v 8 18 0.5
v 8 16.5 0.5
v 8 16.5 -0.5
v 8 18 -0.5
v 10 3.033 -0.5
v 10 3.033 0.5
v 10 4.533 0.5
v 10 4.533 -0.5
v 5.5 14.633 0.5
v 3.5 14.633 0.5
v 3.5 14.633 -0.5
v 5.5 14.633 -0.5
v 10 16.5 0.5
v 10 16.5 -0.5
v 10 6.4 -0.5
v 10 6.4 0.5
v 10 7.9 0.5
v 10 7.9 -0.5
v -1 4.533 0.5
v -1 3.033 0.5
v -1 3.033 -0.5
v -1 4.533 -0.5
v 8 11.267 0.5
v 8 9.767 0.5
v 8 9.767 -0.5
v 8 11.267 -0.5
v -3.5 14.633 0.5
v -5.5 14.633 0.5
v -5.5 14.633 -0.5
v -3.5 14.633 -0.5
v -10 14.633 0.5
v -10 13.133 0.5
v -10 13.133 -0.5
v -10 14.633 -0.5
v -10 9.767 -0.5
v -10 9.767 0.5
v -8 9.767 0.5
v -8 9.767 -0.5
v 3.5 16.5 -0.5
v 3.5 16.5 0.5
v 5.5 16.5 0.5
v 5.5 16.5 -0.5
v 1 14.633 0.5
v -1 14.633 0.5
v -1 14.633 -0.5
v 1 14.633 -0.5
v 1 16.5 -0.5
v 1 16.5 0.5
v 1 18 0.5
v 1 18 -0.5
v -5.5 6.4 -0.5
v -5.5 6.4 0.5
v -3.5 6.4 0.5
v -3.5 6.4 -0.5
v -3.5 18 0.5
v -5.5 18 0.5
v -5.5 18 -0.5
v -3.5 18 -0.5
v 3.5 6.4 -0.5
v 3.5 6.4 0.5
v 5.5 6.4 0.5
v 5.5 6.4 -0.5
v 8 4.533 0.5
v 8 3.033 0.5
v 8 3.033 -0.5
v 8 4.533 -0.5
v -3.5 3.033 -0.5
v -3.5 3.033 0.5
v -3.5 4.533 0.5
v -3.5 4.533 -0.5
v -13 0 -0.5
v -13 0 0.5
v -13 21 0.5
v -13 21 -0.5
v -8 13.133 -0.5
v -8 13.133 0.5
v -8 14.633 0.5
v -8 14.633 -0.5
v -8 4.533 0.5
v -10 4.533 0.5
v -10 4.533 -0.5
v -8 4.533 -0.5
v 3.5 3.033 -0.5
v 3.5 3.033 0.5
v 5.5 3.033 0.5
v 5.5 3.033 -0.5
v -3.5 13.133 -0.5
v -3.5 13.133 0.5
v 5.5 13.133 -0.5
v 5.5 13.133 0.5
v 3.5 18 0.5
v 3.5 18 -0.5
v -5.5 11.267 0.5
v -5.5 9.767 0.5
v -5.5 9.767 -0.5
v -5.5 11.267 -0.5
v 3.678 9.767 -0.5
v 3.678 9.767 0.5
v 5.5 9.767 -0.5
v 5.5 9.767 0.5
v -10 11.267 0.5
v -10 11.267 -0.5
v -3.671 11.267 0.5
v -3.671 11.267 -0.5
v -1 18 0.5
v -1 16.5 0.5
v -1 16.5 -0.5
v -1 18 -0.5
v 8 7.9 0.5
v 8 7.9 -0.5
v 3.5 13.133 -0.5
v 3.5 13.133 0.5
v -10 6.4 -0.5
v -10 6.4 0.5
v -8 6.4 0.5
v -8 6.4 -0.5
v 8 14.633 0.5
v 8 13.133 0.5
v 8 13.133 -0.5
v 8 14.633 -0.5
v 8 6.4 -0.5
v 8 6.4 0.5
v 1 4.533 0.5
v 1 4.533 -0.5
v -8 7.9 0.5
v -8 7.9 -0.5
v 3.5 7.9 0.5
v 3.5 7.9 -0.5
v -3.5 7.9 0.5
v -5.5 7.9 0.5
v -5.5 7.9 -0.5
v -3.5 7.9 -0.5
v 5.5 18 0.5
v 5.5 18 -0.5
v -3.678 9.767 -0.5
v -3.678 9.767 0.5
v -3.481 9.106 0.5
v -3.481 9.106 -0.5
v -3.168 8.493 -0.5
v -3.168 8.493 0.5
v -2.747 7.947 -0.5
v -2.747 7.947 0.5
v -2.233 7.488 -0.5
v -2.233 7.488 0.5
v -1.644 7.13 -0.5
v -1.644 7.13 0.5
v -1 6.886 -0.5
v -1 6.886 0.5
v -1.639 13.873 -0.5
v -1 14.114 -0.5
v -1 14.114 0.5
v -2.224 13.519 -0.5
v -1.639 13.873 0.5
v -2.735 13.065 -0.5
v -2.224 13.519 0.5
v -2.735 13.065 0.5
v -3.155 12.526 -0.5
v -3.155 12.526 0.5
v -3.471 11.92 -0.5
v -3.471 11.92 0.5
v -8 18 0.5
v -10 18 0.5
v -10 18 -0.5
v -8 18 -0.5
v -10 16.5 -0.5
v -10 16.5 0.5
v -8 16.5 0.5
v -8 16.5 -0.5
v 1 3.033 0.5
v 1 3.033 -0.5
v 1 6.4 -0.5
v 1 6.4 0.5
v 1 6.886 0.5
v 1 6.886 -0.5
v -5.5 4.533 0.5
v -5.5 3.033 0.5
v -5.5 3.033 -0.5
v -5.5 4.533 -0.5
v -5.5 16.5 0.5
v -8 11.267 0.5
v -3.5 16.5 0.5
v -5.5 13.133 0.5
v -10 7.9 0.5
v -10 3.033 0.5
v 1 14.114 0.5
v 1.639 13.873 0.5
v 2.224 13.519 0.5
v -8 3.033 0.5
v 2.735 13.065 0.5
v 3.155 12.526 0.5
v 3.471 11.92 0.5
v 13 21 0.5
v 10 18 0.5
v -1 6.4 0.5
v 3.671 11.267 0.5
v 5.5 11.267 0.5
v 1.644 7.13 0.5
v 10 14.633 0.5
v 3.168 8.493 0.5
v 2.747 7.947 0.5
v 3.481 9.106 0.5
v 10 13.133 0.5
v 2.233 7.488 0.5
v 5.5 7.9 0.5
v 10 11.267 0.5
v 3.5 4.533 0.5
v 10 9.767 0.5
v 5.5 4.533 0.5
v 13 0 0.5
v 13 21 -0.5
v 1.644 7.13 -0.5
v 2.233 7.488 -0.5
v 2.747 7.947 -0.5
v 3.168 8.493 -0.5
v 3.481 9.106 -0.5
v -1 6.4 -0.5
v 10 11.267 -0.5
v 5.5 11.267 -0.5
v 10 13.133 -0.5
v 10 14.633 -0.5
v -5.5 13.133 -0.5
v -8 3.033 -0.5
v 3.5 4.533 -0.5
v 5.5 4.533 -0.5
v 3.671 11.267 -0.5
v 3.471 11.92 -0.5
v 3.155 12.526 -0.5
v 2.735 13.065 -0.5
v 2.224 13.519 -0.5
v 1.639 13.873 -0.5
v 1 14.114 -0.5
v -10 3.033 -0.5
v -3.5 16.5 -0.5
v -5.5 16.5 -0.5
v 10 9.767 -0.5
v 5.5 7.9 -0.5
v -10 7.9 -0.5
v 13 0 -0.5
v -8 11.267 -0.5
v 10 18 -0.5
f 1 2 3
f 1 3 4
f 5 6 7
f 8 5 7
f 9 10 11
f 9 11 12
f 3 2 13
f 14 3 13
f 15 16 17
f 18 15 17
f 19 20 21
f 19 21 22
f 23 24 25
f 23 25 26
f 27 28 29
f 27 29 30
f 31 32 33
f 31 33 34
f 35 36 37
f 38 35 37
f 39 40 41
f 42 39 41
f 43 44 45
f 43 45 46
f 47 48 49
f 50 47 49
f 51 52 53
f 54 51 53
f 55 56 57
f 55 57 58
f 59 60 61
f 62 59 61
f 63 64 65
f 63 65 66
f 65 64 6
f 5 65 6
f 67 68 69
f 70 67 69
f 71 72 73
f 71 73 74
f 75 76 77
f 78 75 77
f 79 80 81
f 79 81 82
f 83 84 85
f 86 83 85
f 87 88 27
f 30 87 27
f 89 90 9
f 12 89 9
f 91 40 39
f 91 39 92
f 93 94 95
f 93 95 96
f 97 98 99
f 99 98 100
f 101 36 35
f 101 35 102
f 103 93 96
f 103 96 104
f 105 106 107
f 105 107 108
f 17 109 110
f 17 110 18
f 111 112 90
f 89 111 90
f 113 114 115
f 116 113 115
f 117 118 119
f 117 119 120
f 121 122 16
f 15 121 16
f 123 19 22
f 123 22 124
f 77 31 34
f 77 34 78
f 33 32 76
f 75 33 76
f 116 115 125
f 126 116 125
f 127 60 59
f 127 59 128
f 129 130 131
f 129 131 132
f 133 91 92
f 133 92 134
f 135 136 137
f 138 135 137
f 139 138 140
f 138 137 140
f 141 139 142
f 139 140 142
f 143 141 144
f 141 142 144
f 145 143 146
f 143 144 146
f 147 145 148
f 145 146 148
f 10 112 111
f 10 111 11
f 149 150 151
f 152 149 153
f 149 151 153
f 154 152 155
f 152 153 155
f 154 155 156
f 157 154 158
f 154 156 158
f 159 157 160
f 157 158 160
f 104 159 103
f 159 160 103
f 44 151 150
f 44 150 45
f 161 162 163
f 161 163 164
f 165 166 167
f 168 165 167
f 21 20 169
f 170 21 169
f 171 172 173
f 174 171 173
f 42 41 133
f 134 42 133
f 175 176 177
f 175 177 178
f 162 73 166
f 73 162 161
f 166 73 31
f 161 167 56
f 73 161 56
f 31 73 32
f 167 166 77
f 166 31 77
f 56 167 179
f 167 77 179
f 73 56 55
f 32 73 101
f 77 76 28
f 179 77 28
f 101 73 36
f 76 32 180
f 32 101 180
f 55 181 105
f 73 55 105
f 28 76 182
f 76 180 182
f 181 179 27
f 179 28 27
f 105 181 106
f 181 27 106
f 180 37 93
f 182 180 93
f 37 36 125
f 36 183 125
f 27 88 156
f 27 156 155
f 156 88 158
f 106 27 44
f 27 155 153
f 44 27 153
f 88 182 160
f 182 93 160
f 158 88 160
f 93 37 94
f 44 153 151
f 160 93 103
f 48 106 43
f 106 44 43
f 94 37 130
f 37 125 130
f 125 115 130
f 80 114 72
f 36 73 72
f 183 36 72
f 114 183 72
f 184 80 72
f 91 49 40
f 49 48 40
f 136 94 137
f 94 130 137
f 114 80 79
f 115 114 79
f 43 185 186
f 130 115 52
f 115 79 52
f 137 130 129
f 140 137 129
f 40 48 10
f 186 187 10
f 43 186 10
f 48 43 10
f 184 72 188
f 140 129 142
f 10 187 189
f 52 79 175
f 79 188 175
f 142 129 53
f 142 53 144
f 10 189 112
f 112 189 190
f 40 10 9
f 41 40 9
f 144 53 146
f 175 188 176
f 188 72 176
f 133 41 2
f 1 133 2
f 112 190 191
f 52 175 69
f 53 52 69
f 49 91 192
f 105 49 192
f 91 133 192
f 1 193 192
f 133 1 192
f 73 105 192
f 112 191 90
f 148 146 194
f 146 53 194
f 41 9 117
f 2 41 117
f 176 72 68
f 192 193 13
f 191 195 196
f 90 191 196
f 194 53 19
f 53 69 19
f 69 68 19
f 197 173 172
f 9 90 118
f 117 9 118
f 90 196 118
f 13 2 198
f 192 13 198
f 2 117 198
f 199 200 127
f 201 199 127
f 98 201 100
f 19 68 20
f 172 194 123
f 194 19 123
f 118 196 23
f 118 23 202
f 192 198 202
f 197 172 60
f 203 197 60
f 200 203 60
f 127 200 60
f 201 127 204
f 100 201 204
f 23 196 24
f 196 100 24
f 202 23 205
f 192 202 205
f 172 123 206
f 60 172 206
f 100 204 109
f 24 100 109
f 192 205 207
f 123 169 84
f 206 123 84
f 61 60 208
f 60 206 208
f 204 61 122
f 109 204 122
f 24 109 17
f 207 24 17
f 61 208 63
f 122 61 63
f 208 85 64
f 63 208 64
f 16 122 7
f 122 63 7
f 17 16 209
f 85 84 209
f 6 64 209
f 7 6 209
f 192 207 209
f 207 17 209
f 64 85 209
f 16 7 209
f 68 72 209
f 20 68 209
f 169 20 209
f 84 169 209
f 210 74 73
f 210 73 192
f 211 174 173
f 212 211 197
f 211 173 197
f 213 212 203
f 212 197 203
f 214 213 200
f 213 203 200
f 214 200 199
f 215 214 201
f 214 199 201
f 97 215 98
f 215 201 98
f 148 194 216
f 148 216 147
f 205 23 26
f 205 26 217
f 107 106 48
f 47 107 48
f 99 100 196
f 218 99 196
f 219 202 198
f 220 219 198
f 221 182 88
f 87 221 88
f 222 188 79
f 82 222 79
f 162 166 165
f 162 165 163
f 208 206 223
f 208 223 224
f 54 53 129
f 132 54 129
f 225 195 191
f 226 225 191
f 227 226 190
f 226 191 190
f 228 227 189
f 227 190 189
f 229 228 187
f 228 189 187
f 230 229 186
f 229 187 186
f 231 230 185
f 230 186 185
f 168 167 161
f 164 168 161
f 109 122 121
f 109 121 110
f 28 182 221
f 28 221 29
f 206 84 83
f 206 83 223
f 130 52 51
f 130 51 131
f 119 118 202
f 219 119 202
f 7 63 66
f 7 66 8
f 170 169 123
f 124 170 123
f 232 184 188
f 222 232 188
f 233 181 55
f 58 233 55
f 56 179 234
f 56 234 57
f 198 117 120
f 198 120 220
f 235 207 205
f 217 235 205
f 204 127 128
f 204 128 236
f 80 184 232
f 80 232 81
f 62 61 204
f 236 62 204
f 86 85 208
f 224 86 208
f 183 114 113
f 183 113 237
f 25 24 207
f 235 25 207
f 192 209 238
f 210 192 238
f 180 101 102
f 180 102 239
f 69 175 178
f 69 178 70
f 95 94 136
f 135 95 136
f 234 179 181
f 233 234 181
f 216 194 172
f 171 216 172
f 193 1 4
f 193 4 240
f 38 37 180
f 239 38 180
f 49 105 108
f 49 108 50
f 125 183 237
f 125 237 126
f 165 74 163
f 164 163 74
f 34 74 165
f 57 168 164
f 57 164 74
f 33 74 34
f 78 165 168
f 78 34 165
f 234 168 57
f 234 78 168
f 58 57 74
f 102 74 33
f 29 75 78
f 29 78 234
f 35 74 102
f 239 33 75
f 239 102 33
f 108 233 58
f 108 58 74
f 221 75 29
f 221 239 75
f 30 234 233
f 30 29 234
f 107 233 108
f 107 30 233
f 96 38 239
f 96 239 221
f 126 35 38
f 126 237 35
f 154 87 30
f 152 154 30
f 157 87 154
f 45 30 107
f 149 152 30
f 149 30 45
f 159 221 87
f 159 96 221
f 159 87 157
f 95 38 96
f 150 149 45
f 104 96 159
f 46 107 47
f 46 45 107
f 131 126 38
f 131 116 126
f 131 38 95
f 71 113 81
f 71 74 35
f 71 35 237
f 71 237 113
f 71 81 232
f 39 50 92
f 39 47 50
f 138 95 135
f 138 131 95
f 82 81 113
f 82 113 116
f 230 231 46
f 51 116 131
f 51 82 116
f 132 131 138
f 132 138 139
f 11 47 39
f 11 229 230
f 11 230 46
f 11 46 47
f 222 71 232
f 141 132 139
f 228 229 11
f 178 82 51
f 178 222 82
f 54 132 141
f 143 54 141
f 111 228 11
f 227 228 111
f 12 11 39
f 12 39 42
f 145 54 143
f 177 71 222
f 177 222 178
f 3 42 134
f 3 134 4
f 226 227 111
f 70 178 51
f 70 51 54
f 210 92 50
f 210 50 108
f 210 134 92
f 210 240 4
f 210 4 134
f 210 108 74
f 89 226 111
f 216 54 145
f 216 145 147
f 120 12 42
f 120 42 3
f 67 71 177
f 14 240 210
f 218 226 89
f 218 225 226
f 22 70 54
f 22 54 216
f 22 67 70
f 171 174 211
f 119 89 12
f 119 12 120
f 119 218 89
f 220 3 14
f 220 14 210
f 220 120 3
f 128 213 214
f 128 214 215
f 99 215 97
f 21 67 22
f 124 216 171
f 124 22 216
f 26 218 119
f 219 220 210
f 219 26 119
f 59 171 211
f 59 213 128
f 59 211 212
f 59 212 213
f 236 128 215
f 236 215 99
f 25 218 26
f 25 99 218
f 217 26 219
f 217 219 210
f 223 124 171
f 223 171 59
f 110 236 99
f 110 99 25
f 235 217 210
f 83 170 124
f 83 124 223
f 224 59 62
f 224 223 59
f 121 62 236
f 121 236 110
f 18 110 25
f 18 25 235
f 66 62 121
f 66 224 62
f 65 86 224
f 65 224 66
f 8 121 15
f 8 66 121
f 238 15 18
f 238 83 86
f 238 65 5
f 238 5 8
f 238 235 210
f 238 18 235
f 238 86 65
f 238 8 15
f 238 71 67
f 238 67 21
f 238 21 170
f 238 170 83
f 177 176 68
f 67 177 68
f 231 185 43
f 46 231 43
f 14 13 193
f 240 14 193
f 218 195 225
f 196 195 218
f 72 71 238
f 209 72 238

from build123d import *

# Parameters (mm, degrees)
SKETCH1_W           = 26
SKETCH1_H           = 1
BOSS_EXTRUDE1_DEPTH = 21
SKETCH2_W           = 2
SKETCH2_H           = 1.5
CUT_EXTRUDE1_DEPTH  = 1
CUT_EXTRUDE3_REACH  = 26.718
SKETCH3_R           = 3.75


with BuildPart() as part:
    # Sketch1 → Boss-Extrude1 (new body)
    with BuildSketch(Plane(origin=(0, 0, 0), x_dir=(1, 0, 0), z_dir=(0, 1, 0))):
        Rectangle(SKETCH1_W, SKETCH1_H)
    extrude(amount=BOSS_EXTRUDE1_DEPTH)

    # Sketch2 → Cut-Extrude1 (cut)
    with BuildSketch(Plane.XY.offset(0.5)):
        with Locations((-4.5, 17.25)):
            Rectangle(SKETCH2_W, SKETCH2_H)
        with Locations((-9, 17.25)):
            Rectangle(SKETCH2_W, SKETCH2_H)
        with Locations((0, 17.25)):
            Rectangle(SKETCH2_W, SKETCH2_H)
        with Locations((4.5, 17.25)):
            Rectangle(SKETCH2_W, SKETCH2_H)
        with Locations((9, 17.25)):
            Rectangle(SKETCH2_W, SKETCH2_H)
        with Locations((-9, 13.883333)):
            Rectangle(SKETCH2_W, SKETCH2_H)
        with Locations((-4.5, 13.883333)):
            Rectangle(SKETCH2_W, SKETCH2_H)
        with Locations((0, 13.883333)):
            Rectangle(SKETCH2_W, SKETCH2_H)
        with Locations((4.5, 13.883333)):
            Rectangle(SKETCH2_W, SKETCH2_H)
        with Locations((9, 13.883333)):
            Rectangle(SKETCH2_W, SKETCH2_H)
        with Locations((-9, 10.516666)):
            Rectangle(SKETCH2_W, SKETCH2_H)
        with Locations((-4.5, 10.516666)):
            Rectangle(SKETCH2_W, SKETCH2_H)
        with Locations((0, 10.516666)):
            Rectangle(SKETCH2_W, SKETCH2_H)
        with Locations((4.5, 10.516666)):
            Rectangle(SKETCH2_W, SKETCH2_H)
        with Locations((9, 10.516666)):
            Rectangle(SKETCH2_W, SKETCH2_H)
        with Locations((-9, 7.149999)):
            Rectangle(SKETCH2_W, SKETCH2_H)
        with Locations((-4.5, 7.149999)):
            Rectangle(SKETCH2_W, SKETCH2_H)
        with Locations((0, 7.149999)):
            Rectangle(SKETCH2_W, SKETCH2_H)
        with Locations((4.5, 7.149999)):
            Rectangle(SKETCH2_W, SKETCH2_H)
        with Locations((9, 7.149999)):
            Rectangle(SKETCH2_W, SKETCH2_H)
        with Locations((-9, 3.783332)):
            Rectangle(SKETCH2_W, SKETCH2_H)
        with Locations((-4.5, 3.783332)):
            Rectangle(SKETCH2_W, SKETCH2_H)
        with Locations((0, 3.783332)):
            Rectangle(SKETCH2_W, SKETCH2_H)
        with Locations((4.5, 3.783332)):
            Rectangle(SKETCH2_W, SKETCH2_H)
        with Locations((9, 3.783332)):
            Rectangle(SKETCH2_W, SKETCH2_H)
    extrude(amount=-CUT_EXTRUDE1_DEPTH, mode=Mode.SUBTRACT)

    # Sketch3 → Cut-Extrude3 (cut, up to next)
    with BuildSketch(Plane.XY.offset(0.5), mode=Mode.PRIVATE) as cut_extrude3_sk1:
        with Locations((0, 10.5)):
            Circle(SKETCH3_R)
    cut_extrude3_tool1 = extrude(cut_extrude3_sk1.sketch, amount=-CUT_EXTRUDE3_REACH, mode=Mode.PRIVATE) & part.part
    add(cut_extrude3_tool1.solids().sort_by_distance((0, 10.5, 0.5))[0], mode=Mode.SUBTRACT)


solid = part.part
